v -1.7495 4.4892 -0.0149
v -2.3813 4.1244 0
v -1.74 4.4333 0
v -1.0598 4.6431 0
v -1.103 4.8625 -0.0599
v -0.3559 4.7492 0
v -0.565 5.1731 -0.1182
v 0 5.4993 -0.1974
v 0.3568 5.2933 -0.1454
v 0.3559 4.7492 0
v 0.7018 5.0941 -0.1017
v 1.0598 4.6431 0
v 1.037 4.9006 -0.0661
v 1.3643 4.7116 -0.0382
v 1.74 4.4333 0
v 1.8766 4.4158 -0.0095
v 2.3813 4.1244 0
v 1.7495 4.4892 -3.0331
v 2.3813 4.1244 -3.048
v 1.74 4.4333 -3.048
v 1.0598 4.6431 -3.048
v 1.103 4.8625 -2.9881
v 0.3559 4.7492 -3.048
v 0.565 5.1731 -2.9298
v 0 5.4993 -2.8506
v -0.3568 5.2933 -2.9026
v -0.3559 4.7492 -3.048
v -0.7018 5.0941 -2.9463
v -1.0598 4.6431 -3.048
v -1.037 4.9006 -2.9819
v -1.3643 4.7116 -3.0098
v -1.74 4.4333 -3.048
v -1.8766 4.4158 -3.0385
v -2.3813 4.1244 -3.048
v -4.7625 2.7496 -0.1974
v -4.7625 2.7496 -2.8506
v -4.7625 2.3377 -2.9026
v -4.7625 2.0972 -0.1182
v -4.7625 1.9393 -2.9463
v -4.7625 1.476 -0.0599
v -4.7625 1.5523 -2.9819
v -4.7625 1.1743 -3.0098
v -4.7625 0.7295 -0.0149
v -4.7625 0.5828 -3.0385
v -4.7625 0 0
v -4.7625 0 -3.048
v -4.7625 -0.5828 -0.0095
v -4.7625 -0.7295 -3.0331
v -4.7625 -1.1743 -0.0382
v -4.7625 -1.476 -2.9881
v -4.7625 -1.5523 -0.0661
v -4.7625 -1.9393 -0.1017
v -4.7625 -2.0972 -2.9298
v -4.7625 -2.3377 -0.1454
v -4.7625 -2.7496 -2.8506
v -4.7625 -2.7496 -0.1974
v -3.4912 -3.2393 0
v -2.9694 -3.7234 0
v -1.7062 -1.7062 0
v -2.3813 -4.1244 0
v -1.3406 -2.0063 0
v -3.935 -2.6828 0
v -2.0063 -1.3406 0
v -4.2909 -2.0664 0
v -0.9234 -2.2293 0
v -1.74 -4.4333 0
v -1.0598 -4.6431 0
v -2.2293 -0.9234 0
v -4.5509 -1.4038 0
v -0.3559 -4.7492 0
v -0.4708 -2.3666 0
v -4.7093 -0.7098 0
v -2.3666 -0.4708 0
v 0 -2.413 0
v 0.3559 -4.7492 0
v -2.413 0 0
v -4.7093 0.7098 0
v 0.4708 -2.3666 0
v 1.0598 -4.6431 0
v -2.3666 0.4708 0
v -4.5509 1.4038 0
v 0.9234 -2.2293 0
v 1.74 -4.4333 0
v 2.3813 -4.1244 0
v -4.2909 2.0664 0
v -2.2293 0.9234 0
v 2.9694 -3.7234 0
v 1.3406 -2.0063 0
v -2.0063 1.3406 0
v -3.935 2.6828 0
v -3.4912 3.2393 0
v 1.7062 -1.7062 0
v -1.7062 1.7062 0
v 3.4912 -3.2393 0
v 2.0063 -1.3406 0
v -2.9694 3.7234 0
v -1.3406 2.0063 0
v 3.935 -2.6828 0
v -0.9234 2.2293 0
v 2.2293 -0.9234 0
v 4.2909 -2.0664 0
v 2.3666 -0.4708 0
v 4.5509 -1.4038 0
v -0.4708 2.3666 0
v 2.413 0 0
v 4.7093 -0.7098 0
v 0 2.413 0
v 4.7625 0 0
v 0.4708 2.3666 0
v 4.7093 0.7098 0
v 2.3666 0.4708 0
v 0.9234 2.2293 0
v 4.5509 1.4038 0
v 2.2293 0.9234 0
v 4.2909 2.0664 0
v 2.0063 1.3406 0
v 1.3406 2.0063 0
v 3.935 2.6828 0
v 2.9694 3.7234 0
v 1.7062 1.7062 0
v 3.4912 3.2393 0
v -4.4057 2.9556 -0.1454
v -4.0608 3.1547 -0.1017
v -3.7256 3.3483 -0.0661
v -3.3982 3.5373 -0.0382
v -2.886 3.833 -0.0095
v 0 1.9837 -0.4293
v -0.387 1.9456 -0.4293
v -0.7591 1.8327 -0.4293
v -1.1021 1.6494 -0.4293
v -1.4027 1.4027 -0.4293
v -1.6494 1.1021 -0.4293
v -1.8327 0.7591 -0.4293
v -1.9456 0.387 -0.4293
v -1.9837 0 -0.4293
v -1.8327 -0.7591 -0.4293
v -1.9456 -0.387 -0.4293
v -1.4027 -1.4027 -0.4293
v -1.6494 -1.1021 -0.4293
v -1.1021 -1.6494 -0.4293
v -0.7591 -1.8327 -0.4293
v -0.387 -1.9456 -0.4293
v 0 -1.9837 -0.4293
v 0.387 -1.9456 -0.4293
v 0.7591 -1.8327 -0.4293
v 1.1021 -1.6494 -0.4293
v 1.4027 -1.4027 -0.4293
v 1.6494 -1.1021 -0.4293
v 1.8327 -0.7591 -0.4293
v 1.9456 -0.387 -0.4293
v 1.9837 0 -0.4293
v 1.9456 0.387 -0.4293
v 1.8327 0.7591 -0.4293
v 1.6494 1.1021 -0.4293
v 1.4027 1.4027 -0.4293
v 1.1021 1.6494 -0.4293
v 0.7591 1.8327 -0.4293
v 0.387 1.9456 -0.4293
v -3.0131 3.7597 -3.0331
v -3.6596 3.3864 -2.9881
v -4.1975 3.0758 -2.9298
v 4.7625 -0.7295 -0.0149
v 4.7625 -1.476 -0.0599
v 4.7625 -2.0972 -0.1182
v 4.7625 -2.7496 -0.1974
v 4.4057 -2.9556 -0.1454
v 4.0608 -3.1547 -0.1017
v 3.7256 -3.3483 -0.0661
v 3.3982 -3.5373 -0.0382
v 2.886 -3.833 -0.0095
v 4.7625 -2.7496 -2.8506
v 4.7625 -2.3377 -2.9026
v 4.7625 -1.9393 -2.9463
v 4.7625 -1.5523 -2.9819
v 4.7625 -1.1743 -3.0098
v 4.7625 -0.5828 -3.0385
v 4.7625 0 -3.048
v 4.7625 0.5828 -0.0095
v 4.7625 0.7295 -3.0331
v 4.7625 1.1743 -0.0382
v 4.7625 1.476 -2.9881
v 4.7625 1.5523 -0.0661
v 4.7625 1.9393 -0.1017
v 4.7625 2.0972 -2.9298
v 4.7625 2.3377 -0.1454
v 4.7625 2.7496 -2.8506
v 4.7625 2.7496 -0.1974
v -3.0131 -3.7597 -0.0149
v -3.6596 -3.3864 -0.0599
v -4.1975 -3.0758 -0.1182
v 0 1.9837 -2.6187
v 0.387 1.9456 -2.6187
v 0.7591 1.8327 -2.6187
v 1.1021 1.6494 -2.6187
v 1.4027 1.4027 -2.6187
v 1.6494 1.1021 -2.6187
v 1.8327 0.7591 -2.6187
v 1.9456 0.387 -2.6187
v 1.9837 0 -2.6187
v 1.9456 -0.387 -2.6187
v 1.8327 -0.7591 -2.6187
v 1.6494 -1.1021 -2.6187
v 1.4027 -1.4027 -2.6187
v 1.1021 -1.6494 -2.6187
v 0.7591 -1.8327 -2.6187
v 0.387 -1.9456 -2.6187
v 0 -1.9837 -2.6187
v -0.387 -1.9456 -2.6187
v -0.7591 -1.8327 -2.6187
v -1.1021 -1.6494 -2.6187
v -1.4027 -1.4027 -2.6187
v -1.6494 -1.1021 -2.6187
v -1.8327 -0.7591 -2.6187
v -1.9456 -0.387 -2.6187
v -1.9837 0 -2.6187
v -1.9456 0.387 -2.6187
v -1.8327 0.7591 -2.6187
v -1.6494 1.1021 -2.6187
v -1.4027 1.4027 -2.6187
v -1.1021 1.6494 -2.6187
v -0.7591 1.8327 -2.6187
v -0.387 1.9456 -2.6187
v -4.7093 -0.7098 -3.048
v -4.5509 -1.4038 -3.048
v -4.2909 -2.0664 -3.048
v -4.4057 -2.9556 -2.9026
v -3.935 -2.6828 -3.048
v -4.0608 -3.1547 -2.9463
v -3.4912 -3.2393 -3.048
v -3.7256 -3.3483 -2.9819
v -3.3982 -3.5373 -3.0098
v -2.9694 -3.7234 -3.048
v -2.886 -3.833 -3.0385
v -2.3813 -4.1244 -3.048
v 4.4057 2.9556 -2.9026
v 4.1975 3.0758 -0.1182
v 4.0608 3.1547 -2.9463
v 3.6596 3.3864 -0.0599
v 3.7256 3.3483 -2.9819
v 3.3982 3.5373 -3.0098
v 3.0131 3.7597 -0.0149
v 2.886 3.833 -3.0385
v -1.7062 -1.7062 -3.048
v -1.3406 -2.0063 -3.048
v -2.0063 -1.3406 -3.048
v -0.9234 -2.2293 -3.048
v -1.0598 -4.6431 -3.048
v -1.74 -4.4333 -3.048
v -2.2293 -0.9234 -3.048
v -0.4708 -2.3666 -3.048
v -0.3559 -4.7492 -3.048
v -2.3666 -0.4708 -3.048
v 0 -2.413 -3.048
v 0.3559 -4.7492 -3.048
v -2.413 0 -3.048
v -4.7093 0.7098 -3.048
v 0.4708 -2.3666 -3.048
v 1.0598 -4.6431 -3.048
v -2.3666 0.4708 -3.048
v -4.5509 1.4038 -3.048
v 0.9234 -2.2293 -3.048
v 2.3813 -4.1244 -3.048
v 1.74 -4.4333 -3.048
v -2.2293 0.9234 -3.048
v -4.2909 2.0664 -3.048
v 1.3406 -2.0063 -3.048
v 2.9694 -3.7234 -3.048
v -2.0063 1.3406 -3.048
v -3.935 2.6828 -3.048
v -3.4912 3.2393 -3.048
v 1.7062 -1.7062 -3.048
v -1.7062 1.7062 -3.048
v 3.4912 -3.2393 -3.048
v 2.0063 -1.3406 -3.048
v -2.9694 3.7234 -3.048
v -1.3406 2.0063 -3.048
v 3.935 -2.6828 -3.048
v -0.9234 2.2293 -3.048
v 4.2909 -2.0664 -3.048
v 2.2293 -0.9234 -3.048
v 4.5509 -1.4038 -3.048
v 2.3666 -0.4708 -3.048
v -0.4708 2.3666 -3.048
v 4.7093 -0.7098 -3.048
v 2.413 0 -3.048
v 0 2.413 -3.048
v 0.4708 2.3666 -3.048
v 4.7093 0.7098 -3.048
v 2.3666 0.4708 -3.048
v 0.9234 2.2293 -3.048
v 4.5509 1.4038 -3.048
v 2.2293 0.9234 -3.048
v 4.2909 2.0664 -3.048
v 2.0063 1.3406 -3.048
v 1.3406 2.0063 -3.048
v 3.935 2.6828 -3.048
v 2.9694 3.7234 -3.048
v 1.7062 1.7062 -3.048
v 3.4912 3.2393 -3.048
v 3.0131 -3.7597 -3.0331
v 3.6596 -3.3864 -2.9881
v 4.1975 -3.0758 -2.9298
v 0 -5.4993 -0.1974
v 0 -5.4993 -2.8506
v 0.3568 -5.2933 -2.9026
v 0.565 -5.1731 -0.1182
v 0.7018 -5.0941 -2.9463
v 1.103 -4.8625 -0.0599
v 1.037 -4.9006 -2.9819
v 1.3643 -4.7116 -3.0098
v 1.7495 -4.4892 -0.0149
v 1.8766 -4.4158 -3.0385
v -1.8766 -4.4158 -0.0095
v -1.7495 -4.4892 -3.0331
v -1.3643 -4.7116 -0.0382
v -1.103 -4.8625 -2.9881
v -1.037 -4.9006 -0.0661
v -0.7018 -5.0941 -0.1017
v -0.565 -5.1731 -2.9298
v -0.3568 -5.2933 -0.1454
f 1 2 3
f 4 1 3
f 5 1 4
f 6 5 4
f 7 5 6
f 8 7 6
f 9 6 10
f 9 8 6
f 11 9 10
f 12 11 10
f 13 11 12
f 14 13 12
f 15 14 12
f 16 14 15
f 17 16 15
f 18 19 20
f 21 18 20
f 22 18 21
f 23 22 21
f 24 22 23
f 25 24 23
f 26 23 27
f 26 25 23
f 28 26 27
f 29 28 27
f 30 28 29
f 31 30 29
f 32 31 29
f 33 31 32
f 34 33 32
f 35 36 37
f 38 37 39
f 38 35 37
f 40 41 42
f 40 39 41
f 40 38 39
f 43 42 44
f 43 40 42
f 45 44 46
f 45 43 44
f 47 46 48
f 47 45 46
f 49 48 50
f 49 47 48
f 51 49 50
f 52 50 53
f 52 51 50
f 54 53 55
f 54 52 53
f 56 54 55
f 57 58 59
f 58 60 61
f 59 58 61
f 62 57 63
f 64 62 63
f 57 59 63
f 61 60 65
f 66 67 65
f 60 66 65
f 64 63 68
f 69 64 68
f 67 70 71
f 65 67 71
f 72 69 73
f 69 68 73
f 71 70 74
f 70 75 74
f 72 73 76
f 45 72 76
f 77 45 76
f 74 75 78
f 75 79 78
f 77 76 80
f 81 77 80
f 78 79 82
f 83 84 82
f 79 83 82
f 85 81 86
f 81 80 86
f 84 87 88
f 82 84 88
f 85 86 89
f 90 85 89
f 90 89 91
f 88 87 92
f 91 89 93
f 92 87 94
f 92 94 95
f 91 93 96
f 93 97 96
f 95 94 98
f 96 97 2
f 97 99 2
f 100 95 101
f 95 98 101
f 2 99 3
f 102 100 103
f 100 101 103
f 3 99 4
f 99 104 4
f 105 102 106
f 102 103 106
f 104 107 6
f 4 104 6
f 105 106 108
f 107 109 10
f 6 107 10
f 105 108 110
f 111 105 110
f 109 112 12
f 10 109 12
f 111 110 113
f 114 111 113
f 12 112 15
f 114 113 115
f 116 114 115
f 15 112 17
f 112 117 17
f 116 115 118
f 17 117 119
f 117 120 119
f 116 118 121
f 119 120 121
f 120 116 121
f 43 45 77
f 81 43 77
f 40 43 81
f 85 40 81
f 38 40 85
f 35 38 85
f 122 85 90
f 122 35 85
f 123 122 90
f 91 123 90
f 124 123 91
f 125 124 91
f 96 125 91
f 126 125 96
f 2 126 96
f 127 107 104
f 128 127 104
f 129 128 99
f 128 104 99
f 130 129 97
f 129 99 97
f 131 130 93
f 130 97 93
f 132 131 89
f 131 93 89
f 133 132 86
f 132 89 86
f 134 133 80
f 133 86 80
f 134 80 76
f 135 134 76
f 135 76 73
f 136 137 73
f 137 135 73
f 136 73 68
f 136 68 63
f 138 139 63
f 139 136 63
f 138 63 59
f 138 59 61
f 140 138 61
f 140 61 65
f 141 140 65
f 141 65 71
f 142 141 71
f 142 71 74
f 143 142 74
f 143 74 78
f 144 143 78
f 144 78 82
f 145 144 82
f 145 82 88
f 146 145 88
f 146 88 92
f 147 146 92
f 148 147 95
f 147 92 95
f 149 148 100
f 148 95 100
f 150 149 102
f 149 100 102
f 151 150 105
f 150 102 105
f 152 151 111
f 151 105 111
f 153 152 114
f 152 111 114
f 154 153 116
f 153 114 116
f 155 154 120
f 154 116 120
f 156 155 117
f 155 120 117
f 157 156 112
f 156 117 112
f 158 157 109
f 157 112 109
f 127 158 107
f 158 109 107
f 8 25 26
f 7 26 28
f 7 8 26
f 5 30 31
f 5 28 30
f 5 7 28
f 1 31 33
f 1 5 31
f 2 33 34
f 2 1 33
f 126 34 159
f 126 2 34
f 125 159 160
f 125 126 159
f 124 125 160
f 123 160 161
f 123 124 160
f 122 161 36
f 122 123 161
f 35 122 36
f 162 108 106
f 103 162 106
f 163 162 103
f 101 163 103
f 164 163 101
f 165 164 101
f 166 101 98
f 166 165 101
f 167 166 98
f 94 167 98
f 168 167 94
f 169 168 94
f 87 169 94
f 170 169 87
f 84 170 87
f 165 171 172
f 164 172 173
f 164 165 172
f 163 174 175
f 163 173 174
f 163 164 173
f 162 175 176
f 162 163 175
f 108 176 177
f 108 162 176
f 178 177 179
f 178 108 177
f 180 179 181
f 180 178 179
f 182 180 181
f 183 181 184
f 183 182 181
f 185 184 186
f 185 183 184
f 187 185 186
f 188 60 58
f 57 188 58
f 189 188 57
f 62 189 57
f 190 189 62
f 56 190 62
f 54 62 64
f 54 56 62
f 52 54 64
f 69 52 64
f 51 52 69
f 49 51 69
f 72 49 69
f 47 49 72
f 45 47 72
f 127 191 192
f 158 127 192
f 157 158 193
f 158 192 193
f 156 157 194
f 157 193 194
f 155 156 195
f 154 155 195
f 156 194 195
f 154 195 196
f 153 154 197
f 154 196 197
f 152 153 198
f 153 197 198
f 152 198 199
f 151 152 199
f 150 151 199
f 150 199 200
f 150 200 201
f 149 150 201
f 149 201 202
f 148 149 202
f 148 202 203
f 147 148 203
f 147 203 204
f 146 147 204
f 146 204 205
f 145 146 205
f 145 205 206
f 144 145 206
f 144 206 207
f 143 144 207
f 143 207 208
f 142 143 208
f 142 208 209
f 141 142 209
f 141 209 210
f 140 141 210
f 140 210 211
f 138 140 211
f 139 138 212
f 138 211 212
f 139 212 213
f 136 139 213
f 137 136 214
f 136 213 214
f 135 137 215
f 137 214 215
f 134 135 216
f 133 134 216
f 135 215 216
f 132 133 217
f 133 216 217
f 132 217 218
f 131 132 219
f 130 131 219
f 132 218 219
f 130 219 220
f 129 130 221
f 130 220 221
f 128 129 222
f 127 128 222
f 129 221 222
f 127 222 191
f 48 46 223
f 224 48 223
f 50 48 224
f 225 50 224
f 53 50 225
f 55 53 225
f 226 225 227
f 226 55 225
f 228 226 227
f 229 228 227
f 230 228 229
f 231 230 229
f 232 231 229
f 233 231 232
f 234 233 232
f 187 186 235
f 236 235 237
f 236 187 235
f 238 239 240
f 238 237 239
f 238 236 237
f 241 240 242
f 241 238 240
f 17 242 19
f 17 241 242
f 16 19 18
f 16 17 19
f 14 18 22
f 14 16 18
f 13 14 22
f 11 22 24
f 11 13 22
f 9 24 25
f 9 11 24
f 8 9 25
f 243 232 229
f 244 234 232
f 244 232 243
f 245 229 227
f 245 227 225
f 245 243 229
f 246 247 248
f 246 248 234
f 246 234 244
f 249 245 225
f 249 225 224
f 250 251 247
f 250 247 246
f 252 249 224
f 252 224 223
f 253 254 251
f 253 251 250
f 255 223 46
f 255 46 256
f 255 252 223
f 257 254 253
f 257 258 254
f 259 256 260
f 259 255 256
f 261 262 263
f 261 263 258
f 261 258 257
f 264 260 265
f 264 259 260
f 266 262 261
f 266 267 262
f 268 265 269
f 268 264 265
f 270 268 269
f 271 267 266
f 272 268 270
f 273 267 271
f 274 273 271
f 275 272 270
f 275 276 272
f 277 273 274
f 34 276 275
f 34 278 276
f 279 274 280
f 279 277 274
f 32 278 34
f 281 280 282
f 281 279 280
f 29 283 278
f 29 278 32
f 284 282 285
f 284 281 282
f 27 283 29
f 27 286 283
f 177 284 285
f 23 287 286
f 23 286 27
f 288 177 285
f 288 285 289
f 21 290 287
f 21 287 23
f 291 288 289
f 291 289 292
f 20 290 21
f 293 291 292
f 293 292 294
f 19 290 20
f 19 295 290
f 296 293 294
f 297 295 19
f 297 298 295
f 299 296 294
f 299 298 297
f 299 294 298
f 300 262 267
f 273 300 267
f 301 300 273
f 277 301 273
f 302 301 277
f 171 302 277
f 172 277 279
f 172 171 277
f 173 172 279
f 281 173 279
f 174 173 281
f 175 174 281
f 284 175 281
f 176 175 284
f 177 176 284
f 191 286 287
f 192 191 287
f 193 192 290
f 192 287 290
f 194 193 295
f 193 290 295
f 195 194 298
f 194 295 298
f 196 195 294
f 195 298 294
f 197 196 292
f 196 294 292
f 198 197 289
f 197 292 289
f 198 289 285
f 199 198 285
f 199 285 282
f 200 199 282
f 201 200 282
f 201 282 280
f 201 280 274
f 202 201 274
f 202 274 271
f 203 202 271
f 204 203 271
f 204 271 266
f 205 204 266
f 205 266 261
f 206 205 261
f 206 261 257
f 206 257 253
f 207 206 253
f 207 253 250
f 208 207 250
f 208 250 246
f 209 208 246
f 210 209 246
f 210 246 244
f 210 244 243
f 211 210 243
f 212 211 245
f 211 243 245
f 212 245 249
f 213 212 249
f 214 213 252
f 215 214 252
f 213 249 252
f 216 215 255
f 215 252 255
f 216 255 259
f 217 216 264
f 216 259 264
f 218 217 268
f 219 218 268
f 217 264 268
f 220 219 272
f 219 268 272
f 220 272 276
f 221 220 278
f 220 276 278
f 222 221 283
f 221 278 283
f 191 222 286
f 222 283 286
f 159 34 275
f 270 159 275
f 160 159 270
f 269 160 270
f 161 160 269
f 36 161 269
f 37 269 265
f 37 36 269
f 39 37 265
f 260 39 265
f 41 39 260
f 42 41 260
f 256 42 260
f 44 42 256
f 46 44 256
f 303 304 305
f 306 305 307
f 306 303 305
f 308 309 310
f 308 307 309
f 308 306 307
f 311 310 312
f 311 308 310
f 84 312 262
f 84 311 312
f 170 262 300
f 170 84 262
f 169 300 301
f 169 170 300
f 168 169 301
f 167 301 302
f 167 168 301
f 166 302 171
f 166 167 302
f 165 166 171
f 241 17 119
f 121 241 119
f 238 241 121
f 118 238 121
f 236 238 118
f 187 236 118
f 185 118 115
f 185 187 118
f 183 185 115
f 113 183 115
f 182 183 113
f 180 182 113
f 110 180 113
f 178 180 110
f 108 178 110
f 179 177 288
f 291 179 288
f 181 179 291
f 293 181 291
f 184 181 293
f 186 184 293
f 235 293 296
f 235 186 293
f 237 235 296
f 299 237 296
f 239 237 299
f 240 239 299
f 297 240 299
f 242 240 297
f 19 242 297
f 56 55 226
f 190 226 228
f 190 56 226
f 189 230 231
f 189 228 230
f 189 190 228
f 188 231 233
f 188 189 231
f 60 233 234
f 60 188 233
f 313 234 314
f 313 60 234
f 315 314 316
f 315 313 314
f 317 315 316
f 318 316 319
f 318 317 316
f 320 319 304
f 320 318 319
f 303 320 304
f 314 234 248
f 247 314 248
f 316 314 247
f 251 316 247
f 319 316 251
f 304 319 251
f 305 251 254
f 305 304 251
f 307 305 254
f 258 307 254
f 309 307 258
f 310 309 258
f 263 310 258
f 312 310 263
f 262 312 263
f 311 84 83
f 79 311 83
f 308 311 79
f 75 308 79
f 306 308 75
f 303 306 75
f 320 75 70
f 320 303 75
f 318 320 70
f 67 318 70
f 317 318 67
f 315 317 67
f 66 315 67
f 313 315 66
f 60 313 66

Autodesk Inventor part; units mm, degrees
sketch "Sketch_8" plane through (0, 0, 0) normal (1, 0, 0) x (0, 1, 0)
  line L0 (0, -3.048) -> (0, 0)
  line L1 (0, 0) -> (4.7625, 0)
  line L2 (4.7625, 0) -> (5.715, -0.2552)
  line L3 (5.715, -0.2552) -> (5.715, -2.7928)
  line L4 (5.715, -2.7928) -> (4.7625, -3.048)
  line L5 (4.7625, -3.048) -> (0, -3.048)
  line L6 (0, -3.048) -> (0, 0)
sketch "Sketch_10" plane through (0, 0, 0) normal (0, 0, 1) x (1, 0, 0)
  line L0 (-9.525, -9.525) -> (9.525, -9.525)
  line L1 (9.525, -9.525) -> (9.525, 9.525)
  line L2 (9.525, 9.525) -> (-9.525, 9.525)
  line L3 (-9.525, 9.525) -> (-9.525, -9.525)
  line L4 (-4.7625, -2.7496) -> (0, -5.4993)
  line L5 (0, -5.4993) -> (4.7625, -2.7496)
  line L6 (4.7625, -2.7496) -> (4.7625, 2.7496)
  line L7 (4.7625, 2.7496) -> (0, 5.4993)
  line L8 (0, 5.4993) -> (-4.7625, 2.7496)
  line L9 (-4.7625, 2.7496) -> (-4.7625, -2.7496)
revolve "Revolution1" add sketch "Sketch_8" angle 360 about axis through (0, 0, -3.048) along (0, 0, -1)
extrude "Extrusion1" cut sketch "Sketch_10" against normal blind 3.048
sketch "Sketch_11" plane through (0, 0, 0) normal (1, 0, 0) x (0, 1, 0)
  line L0 (0, -3.048) -> (0, 0)
  line L1 (0, 0) -> (2.413, 0)
  line L2 (2.413, 0) -> (1.9837, -0.4293)
  line L3 (1.9837, -0.4293) -> (1.9837, -2.6187)
  line L4 (1.9837, -2.6187) -> (2.413, -3.048)
  line L5 (2.413, -3.048) -> (0, -3.048)
  line L6 (0, -3.048) -> (0, 0)
revolve "Revolution2" cut sketch "Sketch_11" angle 360 about axis through (0, 0, -3.048) along (0, 0, -1)
thread "Thread1" size "10-32 UNF" class "2B" standard "ANSI Unified Screw Threads" full length
ref_plane "NUT_XY" through (0, 0, 0) normal (0, 0, 1) x (1, 0, 0)
ref_plane "NUT_YZ" through (0, 0, 0) normal (1, 0, 0) x (0, 1, 0)
ref_plane "NUT_ZX" through (0, 0, 0) normal (0, 1, 0) x (0, 0, 1)
ref_plane "a1_XY" through (-4.7625, 4.7625, 0) normal (0, 0, 1) x (1, 0, 0)
ref_plane "a1_YZ" through (-4.7625, 4.7625, 0) normal (1, 0, 0) x (0, 1, 0)
ref_plane "a1_ZX" through (-4.7625, 4.7625, 0) normal (0, 1, 0) x (0, 0, 1)
ref_plane "a2_XY" through (4.7625, 4.7625, 0) normal (0, 0, 1) x (1, 0, 0)
ref_plane "a2_YZ" through (4.7625, 4.7625, 0) normal (1, 0, 0) x (0, 1, 0)
ref_plane "a2_ZX" through (4.7625, 4.7625, 0) normal (0, 1, 0) x (0, 0, 1)
ref_plane "b1_XY" through (0, 4.7625, 0) normal (1, 0, 0) x (0, 0, -1)
ref_plane "b1_YZ" through (0, 4.7625, 0) normal (0, 0, -1) x (0, 1, 0)
ref_plane "b1_ZX" through (0, 4.7625, 0) normal (0, 1, 0) x (1, 0, 0)
ref_plane "b2_XY" through (0, 4.7625, -3.048) normal (1, 0, 0) x (0, 0, -1)
ref_plane "b2_YZ" through (0, 4.7625, -3.048) normal (0, 0, -1) x (0, 1, 0)
ref_plane "b2_ZX" through (0, 4.7625, -3.048) normal (0, 1, 0) x (1, 0, 0)
ref_plane "e_XY" through (0, 0, -3.048) normal (1, 0, 0) x (0, 0, -1)
ref_plane "e_YZ" through (0, 0, -3.048) normal (0, 0, -1) x (0, 1, 0)
ref_plane "e_ZX" through (0, 0, -3.048) normal (0, 1, 0) x (1, 0, 0)
ref_plane "ol1_XY" through (0, 0, -4.7625) normal (0, 1, 0) x (1, 0, 0)
ref_plane "ol1_YZ" through (0, 0, -4.7625) normal (1, 0, 0) x (0, 0, -1)
ref_plane "ol1_ZX" through (0, 0, -4.7625) normal (0, 0, -1) x (0, 1, 0)
ref_plane "ol2_XY" through (3.048, 0, -4.7625) normal (0, 1, 0) x (1, 0, 0)
ref_plane "ol2_YZ" through (3.048, 0, -4.7625) normal (1, 0, 0) x (0, 0, -1)
ref_plane "ol2_ZX" through (3.048, 0, -4.7625) normal (0, 0, -1) x (0, 1, 0)
ref_plane "th1_XY" through (0, 2.413, -3.048) normal (1, 0, 0) x (0, 0, -1)
ref_plane "th1_YZ" through (0, 2.413, -3.048) normal (0, 0, -1) x (0, 1, 0)
ref_plane "th1_ZX" through (0, 2.413, -3.048) normal (0, 1, 0) x (1, 0, 0)
ref_plane "th2_XY" through (0, -2.413, -3.048) normal (1, 0, 0) x (0, 0, -1)
ref_plane "th2_YZ" through (0, -2.413, -3.048) normal (0, 0, -1) x (0, 1, 0)
ref_plane "th2_ZX" through (0, -2.413, -3.048) normal (0, 1, 0) x (1, 0, 0)
properties part number "D-5288"
